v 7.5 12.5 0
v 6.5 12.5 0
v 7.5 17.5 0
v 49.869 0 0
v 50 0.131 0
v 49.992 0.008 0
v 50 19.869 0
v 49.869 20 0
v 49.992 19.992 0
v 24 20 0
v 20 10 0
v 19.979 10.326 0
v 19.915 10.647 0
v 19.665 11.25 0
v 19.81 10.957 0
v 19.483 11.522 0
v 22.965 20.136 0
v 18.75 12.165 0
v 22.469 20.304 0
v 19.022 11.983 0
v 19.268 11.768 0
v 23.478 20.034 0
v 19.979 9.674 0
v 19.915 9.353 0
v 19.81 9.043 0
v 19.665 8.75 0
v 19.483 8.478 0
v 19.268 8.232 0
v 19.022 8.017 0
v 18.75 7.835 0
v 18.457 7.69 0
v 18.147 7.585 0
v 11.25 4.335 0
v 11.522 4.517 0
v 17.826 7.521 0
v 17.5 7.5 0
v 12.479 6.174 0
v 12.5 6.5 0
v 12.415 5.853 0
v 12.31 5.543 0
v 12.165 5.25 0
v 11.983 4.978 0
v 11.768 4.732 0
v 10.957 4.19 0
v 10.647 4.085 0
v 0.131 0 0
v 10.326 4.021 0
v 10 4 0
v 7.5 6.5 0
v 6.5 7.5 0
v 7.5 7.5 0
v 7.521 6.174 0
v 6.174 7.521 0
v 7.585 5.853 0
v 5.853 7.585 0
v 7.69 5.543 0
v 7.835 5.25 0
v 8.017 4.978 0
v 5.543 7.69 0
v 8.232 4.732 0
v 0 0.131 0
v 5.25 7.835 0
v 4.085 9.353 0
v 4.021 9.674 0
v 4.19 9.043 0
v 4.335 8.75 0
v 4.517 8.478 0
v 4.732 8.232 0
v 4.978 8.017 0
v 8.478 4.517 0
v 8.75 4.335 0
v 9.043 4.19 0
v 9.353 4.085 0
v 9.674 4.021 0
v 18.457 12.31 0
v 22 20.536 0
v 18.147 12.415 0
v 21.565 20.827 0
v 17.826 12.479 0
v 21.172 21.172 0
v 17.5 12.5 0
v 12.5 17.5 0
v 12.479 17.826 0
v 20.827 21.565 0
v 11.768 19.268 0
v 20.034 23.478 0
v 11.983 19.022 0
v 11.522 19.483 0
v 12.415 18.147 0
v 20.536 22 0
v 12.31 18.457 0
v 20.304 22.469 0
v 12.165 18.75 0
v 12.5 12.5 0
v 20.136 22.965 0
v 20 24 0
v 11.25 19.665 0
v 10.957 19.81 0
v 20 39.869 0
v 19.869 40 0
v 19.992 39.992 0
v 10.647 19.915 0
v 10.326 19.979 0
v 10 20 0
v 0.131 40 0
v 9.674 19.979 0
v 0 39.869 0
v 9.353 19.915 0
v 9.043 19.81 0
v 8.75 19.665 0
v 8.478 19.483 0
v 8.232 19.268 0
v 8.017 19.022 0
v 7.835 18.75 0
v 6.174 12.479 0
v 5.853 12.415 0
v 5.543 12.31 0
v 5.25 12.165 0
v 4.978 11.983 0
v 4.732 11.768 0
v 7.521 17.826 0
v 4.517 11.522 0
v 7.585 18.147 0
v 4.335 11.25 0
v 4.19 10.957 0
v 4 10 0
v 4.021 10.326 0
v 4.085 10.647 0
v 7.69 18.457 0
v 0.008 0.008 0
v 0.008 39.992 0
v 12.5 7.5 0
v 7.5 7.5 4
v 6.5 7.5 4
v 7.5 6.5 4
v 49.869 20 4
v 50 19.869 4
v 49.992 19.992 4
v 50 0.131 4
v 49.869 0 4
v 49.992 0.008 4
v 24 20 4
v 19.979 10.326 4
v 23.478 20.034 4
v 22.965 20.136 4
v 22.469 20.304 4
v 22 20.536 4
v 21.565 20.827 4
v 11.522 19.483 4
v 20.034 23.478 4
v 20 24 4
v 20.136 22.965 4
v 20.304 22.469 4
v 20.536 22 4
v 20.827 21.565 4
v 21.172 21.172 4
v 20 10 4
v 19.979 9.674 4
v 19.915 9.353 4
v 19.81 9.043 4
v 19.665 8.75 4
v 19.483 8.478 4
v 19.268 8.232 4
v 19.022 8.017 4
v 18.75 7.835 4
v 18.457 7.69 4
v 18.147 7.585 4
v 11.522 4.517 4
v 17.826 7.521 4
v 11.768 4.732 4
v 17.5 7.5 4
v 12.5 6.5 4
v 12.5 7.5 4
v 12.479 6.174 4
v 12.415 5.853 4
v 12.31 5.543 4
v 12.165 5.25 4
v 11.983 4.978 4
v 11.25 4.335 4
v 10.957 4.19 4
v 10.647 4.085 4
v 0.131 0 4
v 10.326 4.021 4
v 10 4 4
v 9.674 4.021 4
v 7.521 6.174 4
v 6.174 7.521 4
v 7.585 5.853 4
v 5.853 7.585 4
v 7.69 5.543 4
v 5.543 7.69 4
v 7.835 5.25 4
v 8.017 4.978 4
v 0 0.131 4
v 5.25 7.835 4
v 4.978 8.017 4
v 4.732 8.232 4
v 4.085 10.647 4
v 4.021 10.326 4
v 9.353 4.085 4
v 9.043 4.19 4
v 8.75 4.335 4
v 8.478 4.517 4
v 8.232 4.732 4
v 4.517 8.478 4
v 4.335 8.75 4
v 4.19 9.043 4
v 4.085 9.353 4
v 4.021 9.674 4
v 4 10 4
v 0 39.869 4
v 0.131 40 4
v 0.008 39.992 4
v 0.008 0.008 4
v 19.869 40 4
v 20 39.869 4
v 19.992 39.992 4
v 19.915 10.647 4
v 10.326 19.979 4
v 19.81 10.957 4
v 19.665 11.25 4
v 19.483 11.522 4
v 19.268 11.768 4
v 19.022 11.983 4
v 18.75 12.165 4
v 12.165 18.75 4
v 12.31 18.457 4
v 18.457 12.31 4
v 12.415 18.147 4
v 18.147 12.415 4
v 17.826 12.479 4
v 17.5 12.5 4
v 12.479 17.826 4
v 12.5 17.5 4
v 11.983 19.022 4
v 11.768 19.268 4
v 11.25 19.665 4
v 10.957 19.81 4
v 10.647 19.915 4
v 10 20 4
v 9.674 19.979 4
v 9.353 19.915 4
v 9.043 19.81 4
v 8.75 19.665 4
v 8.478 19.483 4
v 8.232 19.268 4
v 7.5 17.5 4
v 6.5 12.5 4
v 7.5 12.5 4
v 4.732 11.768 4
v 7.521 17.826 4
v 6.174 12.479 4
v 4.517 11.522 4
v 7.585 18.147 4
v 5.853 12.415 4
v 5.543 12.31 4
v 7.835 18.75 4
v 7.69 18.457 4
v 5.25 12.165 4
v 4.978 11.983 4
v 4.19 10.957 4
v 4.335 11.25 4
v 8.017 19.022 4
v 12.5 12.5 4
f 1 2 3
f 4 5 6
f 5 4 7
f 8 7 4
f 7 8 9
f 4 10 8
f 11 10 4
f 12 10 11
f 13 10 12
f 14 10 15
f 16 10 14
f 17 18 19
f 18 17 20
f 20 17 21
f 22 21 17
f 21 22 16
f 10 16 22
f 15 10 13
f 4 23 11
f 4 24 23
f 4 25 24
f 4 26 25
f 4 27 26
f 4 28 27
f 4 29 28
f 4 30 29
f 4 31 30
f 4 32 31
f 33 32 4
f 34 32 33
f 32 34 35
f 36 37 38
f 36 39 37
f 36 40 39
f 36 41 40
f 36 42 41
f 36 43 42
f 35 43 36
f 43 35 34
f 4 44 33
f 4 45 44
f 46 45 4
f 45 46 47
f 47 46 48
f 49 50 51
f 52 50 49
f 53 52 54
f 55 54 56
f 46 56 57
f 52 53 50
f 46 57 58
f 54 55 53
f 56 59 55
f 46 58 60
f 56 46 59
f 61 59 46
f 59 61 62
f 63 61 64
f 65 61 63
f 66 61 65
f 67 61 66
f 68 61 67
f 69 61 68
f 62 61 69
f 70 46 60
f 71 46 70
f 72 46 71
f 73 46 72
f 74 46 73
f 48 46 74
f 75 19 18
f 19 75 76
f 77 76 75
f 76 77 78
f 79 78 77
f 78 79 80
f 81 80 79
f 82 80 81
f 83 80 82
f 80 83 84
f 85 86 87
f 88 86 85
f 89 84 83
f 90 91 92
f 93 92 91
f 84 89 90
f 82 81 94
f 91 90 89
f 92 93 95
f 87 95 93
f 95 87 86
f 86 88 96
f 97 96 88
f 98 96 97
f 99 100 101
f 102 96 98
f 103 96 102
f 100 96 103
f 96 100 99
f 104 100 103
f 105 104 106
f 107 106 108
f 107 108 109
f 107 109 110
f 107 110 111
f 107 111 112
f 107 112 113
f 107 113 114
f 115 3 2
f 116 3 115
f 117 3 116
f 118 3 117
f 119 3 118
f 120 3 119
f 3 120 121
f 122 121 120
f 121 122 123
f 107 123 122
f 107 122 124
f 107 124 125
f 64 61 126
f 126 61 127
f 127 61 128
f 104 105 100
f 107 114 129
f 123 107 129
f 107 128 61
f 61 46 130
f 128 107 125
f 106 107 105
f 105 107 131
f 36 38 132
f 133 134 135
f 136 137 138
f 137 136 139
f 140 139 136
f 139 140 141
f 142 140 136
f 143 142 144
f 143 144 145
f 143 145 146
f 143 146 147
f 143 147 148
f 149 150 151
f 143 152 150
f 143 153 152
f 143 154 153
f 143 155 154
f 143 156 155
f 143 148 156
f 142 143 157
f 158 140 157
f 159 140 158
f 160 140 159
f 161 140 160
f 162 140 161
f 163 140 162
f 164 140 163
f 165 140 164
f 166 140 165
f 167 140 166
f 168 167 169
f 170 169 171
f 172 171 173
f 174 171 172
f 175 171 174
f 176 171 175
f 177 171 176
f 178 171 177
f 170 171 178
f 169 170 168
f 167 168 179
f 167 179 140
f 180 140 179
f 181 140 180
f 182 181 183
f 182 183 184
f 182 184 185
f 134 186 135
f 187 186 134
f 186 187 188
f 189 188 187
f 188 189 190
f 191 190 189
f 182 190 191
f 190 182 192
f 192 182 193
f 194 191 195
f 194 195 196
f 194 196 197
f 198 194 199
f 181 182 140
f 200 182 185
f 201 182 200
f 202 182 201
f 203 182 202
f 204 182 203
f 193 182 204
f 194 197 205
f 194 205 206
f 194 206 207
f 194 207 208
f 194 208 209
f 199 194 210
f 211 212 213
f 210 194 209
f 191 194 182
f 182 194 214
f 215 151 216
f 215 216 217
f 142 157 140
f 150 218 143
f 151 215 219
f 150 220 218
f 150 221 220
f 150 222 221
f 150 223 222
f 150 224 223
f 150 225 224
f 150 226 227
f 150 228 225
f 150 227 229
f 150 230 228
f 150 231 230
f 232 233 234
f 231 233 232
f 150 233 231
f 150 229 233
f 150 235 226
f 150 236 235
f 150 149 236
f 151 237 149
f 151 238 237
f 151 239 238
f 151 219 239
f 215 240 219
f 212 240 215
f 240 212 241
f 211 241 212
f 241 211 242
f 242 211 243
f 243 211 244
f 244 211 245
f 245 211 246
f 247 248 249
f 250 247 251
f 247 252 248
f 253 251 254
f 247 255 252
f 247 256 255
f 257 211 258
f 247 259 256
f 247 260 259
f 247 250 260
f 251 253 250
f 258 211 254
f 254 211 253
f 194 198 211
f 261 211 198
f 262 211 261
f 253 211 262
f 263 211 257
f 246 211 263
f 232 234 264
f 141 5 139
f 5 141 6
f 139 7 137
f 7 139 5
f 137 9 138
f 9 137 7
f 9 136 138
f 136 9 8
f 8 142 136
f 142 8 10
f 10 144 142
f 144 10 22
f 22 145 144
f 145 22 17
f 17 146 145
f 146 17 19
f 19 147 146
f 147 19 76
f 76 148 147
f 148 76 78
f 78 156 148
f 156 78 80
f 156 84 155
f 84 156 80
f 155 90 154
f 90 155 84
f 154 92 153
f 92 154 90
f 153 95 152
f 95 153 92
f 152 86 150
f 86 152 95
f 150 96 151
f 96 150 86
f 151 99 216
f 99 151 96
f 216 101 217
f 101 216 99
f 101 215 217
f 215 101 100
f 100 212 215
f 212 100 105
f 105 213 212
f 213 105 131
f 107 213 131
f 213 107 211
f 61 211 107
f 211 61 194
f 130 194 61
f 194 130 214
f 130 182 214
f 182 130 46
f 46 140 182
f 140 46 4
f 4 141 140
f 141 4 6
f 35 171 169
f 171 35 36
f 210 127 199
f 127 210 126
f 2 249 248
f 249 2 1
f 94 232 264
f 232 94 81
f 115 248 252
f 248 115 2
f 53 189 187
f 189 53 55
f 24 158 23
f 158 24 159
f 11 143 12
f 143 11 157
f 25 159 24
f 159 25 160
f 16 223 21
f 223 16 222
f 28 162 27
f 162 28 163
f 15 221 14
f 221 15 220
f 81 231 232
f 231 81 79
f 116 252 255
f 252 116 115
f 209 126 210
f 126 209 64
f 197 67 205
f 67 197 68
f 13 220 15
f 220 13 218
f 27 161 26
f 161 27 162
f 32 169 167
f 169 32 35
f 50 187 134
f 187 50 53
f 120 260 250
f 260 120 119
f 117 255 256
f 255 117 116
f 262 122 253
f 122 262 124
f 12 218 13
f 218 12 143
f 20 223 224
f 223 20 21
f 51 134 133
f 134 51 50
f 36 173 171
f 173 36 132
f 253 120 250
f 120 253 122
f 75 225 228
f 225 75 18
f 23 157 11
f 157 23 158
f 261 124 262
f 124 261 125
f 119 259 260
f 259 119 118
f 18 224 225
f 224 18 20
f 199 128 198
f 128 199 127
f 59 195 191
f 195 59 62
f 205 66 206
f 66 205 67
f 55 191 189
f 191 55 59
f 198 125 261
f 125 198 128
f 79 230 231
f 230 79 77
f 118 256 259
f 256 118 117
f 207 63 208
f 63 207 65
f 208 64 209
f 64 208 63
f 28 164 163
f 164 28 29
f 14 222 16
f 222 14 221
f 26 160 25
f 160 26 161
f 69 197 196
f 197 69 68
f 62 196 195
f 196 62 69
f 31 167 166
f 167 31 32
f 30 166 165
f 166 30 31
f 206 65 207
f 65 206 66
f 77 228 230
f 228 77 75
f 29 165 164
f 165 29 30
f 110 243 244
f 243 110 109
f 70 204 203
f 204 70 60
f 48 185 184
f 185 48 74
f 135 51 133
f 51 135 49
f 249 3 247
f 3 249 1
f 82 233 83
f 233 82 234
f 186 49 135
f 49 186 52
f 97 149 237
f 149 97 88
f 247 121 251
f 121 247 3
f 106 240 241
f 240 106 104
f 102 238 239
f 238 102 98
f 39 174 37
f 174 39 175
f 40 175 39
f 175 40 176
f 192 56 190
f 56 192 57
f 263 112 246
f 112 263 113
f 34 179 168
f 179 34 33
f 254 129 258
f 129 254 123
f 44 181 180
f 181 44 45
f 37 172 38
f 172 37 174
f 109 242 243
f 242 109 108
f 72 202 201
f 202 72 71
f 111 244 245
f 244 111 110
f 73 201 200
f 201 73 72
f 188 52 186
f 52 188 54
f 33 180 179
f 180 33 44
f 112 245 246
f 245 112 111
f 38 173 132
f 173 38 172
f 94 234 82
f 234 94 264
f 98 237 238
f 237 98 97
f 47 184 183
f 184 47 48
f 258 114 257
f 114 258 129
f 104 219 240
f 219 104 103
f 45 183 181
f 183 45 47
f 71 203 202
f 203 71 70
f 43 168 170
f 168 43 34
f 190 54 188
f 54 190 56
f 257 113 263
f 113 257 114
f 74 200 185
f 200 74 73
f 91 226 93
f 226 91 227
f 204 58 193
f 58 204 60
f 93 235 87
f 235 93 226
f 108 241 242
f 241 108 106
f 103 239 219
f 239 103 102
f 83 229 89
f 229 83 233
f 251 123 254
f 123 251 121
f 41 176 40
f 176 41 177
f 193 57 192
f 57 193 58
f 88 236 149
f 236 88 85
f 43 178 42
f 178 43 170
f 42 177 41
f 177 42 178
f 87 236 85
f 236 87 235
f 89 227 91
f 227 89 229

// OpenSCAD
// =============================================================================
// ADJUSTABLE SLOTTED L-BRACKET
// =============================================================================
// Author  : Arunangshu Roy
// License : CC BY 4.0
//
// MATHEMATICAL BASIS
//
// 1. SLOT GEOMETRY (stadium shape)
//    A slot = rectangle + two semicircular end-caps of radius r.
//    Area = (L - 2r)*2r + PI*r^2
//    Built in OpenSCAD as hull() of two circles separated by (L - 2r) --
//    the convex hull automatically produces the correct stadium outline.
//
// 2. FILLET STRESS RELIEF
//    Internal corner stress concentration factor (thin-plate approximation):
//      Kt ~= 1 + 2*t/r
//    As r -> 0 (sharp corner), Kt -> infinity: a true stress singularity.
//    This is why internal_fillet_r below is never set to 0 -- it is the
//    single most important parameter for bracket fatigue life.
//
// 3. BEND ALLOWANCE (if laser-cut from sheet and bent, not printed)
//    Bend allowance accounts for material stretch at the bend:
//      BA = (PI/180) * angle * (radius + k*thickness)
//    where k (the "K-factor") is typically 0.33-0.5 depending on material
//    and bend method. Relevant if you fabricate this from sheet metal
//    rather than printing it solid.
// =============================================================================
// --- Bracket parameters ---
arm_a_len   = 50;   // Length of first arm (mm)
arm_b_len   = 40;   // Length of second arm (mm)
arm_w       = 20;   // Width of both arms (mm)
thickness   = 4;    // Material thickness (mm)
internal_fillet_r = 4;  // Internal corner fillet -- see stress note above.
                          // NEVER set to 0 in a real design.
// --- Slot parameters ---
slot_len    = 16;   // Total slot length (mm) -- adjustment range
slot_r      = 2.5;  // Slot half-width = bolt clearance radius (mm) -- M4 clearance
slot_inset  = 12;   // Distance from bracket corner to slot center
$fn = 48;
// stadium_2d(): the slot shape -- hull of two circles = rectangle with
// semicircular ends. This is the standard parametric way to build a slot.
module stadium_2d(length, r) {
    hull() {
        translate([-(length - 2*r)/2, 0]) circle(r = r);
        translate([ (length - 2*r)/2, 0]) circle(r = r);
    }
}
// l_bracket_2d(): the bracket's flat profile before extrusion.
// Built as two overlapping rectangles (the two arms) unioned together,
// then filleted internally using offset() -- a cleaner approach than
// manually computing fillet geometry with arcs.
module l_bracket_2d() {
    union() {
        // Arm A (horizontal)
        square([arm_a_len, arm_w]);
        // Arm B (vertical) -- overlaps Arm A at the corner
        square([arm_w, arm_b_len]);
    }
}
// l_bracket_filleted_2d(): applies the internal fillet using OpenSCAD's
// offset() function. offset(r, $fn) with a positive value first, then
// negative, rounds convex corners; the inverse pair rounds concave (internal)
// corners. This avoids manually parametrising fillet arc geometry by hand.
module l_bracket_filleted_2d() {
    offset(r = -internal_fillet_r)
        offset(r = internal_fillet_r)
            l_bracket_2d();
}
// bracket(): extrudes the filleted profile, then subtracts slots on both arms.
module bracket() {
    difference() {
        linear_extrude(height = thickness)
            l_bracket_filleted_2d();
        // Slot in arm A -- oriented along the arm's long axis
        translate([slot_inset, arm_w/2, -0.1])
            linear_extrude(height = thickness + 0.2)
                stadium_2d(slot_len, slot_r);
        // Slot in arm B -- rotated 90deg to align with vertical arm axis
        translate([arm_w/2, slot_inset, -0.1])
            rotate([0, 0, 90])
                linear_extrude(height = thickness + 0.2)
                    stadium_2d(slot_len, slot_r);
    }
}
bracket();
echo("Slot adjustment range:", slot_len - 2*slot_r, "mm");
echo("Internal fillet stress factor Kt (approx):", 1 + 2*thickness/internal_fillet_r);
